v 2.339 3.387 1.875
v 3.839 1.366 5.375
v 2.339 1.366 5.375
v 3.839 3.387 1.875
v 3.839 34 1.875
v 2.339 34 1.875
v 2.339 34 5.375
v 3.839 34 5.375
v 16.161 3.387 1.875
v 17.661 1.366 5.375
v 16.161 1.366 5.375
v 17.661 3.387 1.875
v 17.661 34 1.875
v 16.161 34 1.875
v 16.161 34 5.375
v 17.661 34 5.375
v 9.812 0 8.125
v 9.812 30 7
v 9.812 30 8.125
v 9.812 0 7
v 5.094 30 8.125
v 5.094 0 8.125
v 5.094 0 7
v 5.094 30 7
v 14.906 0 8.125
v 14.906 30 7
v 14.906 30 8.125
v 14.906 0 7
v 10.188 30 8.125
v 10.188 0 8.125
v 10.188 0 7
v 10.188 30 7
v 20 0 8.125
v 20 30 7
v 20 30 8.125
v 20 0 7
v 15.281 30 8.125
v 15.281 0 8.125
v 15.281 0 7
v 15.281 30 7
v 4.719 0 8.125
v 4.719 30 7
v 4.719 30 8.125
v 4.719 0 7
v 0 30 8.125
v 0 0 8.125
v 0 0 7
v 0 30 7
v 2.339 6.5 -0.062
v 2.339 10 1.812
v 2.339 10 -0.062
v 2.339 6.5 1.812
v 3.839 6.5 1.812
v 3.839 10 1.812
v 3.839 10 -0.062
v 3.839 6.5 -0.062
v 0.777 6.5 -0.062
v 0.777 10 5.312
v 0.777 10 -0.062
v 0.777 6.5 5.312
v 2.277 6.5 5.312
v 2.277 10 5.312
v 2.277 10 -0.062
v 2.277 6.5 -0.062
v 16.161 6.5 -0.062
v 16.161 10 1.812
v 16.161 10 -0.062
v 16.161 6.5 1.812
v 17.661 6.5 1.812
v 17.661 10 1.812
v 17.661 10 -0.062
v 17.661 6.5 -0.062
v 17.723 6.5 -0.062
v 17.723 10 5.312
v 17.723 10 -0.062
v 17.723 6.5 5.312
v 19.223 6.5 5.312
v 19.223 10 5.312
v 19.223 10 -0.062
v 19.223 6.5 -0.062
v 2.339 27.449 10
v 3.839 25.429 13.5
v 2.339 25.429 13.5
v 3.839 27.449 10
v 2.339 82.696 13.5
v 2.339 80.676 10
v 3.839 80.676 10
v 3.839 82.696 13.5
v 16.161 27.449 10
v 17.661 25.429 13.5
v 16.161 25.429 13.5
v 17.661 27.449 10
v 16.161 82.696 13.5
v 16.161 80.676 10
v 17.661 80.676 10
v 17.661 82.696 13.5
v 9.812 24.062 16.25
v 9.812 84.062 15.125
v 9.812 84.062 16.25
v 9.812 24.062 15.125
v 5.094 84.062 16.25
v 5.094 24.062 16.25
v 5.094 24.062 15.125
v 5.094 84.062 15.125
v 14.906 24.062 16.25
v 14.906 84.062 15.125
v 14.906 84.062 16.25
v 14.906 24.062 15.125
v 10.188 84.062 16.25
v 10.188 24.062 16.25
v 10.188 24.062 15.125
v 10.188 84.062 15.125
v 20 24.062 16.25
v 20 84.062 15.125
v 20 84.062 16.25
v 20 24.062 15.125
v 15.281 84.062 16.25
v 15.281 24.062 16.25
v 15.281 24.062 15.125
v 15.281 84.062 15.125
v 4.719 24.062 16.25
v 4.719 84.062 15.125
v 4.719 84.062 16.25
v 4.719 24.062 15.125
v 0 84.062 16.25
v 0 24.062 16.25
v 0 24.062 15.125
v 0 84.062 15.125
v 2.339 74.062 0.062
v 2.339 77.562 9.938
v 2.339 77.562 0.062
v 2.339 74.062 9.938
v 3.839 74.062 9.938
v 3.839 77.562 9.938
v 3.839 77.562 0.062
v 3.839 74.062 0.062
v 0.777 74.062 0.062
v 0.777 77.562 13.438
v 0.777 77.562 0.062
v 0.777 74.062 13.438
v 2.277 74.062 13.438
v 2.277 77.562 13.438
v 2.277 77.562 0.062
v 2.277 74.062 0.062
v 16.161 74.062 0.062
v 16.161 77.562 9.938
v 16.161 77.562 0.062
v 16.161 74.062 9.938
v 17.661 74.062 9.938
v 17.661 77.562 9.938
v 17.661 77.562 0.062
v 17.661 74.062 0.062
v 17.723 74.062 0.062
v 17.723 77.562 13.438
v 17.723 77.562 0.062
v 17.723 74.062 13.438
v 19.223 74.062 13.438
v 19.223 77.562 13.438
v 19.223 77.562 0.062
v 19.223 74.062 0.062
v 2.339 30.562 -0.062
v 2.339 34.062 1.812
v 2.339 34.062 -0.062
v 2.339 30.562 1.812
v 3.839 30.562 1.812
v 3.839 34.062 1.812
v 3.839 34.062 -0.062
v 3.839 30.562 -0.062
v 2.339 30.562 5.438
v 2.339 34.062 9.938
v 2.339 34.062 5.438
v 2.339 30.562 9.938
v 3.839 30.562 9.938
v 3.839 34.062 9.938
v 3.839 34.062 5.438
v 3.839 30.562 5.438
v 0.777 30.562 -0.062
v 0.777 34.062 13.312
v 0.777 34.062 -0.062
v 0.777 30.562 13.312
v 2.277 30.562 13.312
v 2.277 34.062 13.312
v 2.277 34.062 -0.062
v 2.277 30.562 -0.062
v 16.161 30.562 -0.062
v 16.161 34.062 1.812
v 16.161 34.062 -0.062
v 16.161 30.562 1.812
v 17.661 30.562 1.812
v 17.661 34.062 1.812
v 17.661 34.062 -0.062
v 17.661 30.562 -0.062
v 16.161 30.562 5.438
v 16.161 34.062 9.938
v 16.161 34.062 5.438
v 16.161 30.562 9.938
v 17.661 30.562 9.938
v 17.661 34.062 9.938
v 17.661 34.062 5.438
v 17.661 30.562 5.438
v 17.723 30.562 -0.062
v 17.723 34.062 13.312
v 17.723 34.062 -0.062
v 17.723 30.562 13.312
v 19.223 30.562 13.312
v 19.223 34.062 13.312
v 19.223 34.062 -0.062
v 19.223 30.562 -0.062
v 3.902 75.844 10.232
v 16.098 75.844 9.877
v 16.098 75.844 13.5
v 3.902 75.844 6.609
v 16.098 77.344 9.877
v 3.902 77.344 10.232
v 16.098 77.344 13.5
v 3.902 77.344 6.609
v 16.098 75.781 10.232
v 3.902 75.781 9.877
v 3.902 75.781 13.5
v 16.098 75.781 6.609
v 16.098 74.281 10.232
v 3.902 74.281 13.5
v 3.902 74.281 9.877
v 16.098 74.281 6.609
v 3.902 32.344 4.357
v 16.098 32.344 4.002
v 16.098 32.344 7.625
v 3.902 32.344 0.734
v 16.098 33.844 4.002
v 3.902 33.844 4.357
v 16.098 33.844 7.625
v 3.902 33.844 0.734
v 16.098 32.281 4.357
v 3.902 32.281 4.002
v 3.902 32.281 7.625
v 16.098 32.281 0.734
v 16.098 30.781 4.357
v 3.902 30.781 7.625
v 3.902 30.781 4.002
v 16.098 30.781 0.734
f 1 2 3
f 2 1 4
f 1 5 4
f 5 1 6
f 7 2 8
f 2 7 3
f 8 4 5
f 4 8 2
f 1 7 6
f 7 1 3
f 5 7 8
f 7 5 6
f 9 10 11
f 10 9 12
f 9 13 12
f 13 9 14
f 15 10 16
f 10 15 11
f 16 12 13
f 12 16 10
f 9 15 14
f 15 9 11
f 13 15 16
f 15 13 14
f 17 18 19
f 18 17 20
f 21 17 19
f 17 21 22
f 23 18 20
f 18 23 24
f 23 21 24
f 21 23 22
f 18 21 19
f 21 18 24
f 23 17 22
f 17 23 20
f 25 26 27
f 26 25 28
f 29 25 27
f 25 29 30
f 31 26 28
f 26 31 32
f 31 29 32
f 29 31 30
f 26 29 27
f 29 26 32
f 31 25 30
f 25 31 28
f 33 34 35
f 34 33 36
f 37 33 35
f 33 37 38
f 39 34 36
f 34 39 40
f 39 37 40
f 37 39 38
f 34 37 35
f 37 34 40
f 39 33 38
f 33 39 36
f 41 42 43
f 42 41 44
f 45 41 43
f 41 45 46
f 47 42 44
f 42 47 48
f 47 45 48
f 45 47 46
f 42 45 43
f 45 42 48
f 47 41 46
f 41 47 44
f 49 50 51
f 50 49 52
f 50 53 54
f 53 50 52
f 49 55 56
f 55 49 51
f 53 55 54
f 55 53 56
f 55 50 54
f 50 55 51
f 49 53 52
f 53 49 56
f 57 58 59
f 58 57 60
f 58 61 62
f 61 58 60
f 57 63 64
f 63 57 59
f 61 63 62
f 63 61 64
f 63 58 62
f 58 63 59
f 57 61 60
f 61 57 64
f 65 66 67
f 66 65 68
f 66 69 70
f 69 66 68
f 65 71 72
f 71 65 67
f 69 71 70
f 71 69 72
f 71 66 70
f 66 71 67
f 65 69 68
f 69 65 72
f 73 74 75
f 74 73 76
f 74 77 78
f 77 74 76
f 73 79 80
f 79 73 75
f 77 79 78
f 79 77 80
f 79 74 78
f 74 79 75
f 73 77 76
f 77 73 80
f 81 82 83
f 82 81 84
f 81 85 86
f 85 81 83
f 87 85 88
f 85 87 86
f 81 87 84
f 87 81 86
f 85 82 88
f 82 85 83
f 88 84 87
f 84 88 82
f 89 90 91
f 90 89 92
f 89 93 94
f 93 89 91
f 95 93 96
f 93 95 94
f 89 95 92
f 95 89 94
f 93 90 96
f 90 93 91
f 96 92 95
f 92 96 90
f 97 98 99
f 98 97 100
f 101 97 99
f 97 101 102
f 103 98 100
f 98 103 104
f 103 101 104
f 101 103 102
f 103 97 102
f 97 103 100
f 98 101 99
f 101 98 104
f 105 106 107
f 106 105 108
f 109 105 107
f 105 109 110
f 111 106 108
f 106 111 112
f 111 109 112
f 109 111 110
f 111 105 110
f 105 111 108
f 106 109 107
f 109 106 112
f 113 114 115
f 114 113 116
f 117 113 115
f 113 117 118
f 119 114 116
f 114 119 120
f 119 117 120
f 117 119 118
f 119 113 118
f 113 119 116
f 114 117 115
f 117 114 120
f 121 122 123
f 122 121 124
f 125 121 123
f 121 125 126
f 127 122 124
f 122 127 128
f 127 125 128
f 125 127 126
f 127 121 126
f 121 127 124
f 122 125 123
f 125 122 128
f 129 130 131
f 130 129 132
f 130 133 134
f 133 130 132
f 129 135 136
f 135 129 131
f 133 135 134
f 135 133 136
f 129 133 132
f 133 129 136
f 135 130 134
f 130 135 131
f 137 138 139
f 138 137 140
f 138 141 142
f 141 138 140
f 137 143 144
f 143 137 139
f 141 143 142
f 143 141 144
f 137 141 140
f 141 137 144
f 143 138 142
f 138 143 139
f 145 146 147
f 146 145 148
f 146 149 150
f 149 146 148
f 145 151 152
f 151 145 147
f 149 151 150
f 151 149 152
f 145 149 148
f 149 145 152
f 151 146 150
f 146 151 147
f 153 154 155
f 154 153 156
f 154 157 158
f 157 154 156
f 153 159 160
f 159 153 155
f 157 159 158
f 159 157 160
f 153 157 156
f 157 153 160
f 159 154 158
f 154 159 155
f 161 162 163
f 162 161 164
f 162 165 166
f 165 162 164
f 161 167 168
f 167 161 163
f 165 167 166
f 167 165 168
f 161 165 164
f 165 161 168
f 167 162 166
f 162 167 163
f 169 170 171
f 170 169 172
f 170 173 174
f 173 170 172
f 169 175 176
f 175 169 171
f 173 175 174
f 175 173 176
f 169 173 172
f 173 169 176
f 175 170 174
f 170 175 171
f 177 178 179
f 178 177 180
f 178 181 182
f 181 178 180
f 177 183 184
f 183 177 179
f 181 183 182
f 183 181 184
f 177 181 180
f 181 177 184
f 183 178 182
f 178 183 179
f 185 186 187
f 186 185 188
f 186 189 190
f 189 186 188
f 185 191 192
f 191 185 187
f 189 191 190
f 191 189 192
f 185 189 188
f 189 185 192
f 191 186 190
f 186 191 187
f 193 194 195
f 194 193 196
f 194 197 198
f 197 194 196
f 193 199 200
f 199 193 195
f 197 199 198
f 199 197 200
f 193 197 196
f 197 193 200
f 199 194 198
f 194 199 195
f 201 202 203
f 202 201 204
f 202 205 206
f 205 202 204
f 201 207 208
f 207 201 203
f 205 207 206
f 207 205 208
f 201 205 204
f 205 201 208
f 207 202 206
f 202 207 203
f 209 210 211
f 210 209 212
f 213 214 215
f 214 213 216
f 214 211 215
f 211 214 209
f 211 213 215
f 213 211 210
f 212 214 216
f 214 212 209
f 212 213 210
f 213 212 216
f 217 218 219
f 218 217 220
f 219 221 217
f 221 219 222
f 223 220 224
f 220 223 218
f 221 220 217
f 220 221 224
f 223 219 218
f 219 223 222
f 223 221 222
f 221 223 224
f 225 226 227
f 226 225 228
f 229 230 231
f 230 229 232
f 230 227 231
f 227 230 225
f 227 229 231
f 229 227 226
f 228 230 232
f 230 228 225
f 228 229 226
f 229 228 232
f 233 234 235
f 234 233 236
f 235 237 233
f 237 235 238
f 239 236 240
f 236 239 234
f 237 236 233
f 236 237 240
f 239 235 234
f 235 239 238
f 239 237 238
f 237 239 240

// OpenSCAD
// brace_angle = 15
// brace_length = 12.6264 [12 5/8] (4)
//
// For 16" bench:
// leg_height = 13.375 [13 3/8] (4)
// leg_height = 9.875 [9 7/8] (2)
// leg_height = 5.375 [5 3/8] (2)
// leg_height = 4.5 [4 1/2] (2)
// leg_height = 1.875 [1 7/8] (4)
//
// For 15" bench:
// leg_height = 12.375 [12 3/8] (4)
// leg_height = 8.875 [8 7/8] (2)
// leg_height = 4.875 [4 7/8] (2)
// leg_height = 4 [4] (2)
// leg_height = 1.375 [1 3/8] (4)
//
// For 14" bench:
// leg_height = 11.375 [11 3/8] (4)
// leg_height = 7.875 [7 7/8] (2)
// leg_height = 4.375 [4 3/8] (2)
// leg_height = 3.5 [3 1/2] (2)
// leg_height = 0.875 [0 7/8] (4)
//
// plank_length = 30, width = 4.125 [4 1/8] (2)
// plank_length = 60, width = 4.125 [4 1/8] (2)
// plank_length = 30, width = 5.3125 [5 5/16] (2)
// plank_length = 60, width = 5.3125 [5 5/16] (2)
//
// support_end_bevel_angle = 30
// support_length = 57.2679 [57 1/4], bevel_both_ends = true (2)
// support_length = 32.634 [32 5/8], bevel_both_ends = false (2)
//
// top_joist_end_bevel_angle = 15
// top_joist_length_bevel_angle = 30
// top_joist_length = 19, bevel_length = true (3)
// top_joist_length = 19 (6)

function mm(x) = cm(x)/10;
function cm(x) = in(x)/2.54;
function in(x) = x;
function ft(x,i=0) = in(x*12+i);

epsilon = mm(1);
explode_gap = in(1/16);

lumber_thickness = in(1.5);
lumber_width = in(3.5);
bench_depth = in(20);
bench_length = in(60);
step_depth = bench_depth;
step_length = in(30);
step_height = in(8);
step_overlap = bench_length + step_length - ft(7);
echo(step_overlap=step_overlap);
bench_height = 2*step_height;
decking_overhang = in(1/2);
top_joist_length = bench_depth - 2*decking_overhang;

decking_natural_width = in(5+5/16);
decking_gap = in(3/8);
decking_planks = ceil((bench_depth + decking_gap) / (decking_natural_width + decking_gap));
decking_width = (bench_depth + decking_gap) / decking_planks - decking_gap;
decking_spacing = decking_width + decking_gap;
decking_thickness = in(1+1/8);

lightwalnut = [0.397, 0.315, 0.228];

side_bevel_angle = 15;
end_bevel_angle = 30;
brace_angle=side_bevel_angle;

echo(side_bevel_angle=side_bevel_angle);
echo(end_bevel_angle=end_bevel_angle);
echo(brace_angle=brace_angle);

echo(leg_setback=step_overlap-tan(end_bevel_angle)*(lumber_width+lumber_thickness));


supports_outside = false;

module top_joist(near_bottom_offset = 0, far_bottom_offset = 0) {
    if (near_bottom_offset!=0||far_bottom_offset!=0) {
        echo(top_joist_length=top_joist_length,bevel_length=true);
    } else {
        echo(top_joist_length=top_joist_length);
    }
    polyhedron(
            points=[[0, 0, lumber_thickness],
                    [top_joist_length, 0, lumber_thickness],
                    [top_joist_length - tan(side_bevel_angle)*lumber_thickness, near_bottom_offset, 0],
                    [tan(side_bevel_angle)*lumber_thickness, near_bottom_offset, 0],
                    [0, lumber_width, lumber_thickness],
                    [top_joist_length, lumber_width, lumber_thickness],
                    [top_joist_length - tan(side_bevel_angle)*lumber_thickness, lumber_width - far_bottom_offset, 0],
                    [tan(side_bevel_angle)*lumber_thickness, lumber_width - far_bottom_offset, 0]],
            faces=[[0, 1, 2, 3],
                   [4, 5, 6, 7],
                   [4, 5, 1, 0],
                   [2, 3, 7, 6],
                   [4, 0, 3, 7],
                   [1, 5, 6, 2]]);
}

module top_joists(length, bevel_far_end = true) {
    translate([decking_overhang, 0, 0]) {
        spans = floor(length / in(12));
        for (i = [0:spans]) {
            spacing = (length - lumber_width - 2*decking_overhang) / spans;
            echo(spacing=spacing);
            translate([0, decking_overhang + i * spacing, 0]) {
                if (i == 0) {
                    top_joist(near_bottom_offset = tan(end_bevel_angle)*lumber_thickness);
                } else if (i == spans && bevel_far_end) {
                    top_joist(far_bottom_offset = tan(end_bevel_angle)*lumber_thickness);
                } else {
                    top_joist();
                }
            }
        }
    }
}
module bench_top_joists() {
    top_joists(bench_length);
}

module step_top_joists() {
    top_joists(step_length, bevel_far_end = false);
}

module planks(length) {
    edge_decking_width = (bench_depth - (decking_spacing - decking_width) - (decking_planks-2) * decking_spacing) / 2;
    translate([-max(0, explode_gap-(decking_spacing - decking_width))*(decking_planks-1)/2, 0, 0]) {
        echo(plank_length=length,width=edge_decking_width);
        cube([edge_decking_width, length, decking_thickness]);
        translate([edge_decking_width + max(decking_spacing - decking_width, explode_gap), 0, 0]) {
            for (i = [0:decking_planks-3]) {
                translate([i * max(decking_spacing, decking_width+explode_gap), 0, 0]) {
                    echo(plank_length=length,width=decking_width);
                    cube([decking_width, length, decking_thickness]);
                }
            }
            translate([(decking_planks - 2) * max(decking_spacing, decking_width + explode_gap), 0, 0]) {
                echo(plank_length=length,width=edge_decking_width);
                cube([edge_decking_width, length, decking_thickness]);
            }
        }
    }
}

module support(length, bevel_far_end = true) {
    translate([0, tan(end_bevel_angle)*lumber_thickness + decking_overhang, 0]) {
        rotate([90, 0, 90]) {
            top_length = length - decking_overhang - tan(end_bevel_angle)*lumber_thickness - (bevel_far_end ? decking_overhang + tan(end_bevel_angle)*lumber_thickness : 0);
            bottom_length = length - decking_overhang - tan(end_bevel_angle)*(lumber_thickness + lumber_width) - (bevel_far_end ? decking_overhang + tan(end_bevel_angle)*(lumber_thickness + lumber_width): 0);
            echo(support_length=top_length,bevel_both_ends=bevel_far_end);
            linear_extrude(height = lumber_thickness) {
                polygon([[0, lumber_width],
                         [top_length, lumber_width],
                         [tan(end_bevel_angle)*lumber_width + bottom_length, 0],
                         [tan(end_bevel_angle)*lumber_width, 0]]);
            }
        }
    }
}

module supports(length, bevel_far_end = true) {
    inset = decking_overhang + tan(side_bevel_angle)*lumber_thickness + (supports_outside?0:lumber_thickness-explode_gap);
    translate([inset, 0, 0]) {
        support(length, bevel_far_end=bevel_far_end);
    }
    translate([bench_depth - inset - lumber_thickness, 0, 0]) {
        support(length, bevel_far_end=bevel_far_end);
    }
}

module leg(height) {
    echo(leg_height=height);
    cube([lumber_thickness, lumber_width, height]);
}

module legs(height, length, include_far_legs = true) {
    inset = decking_overhang + tan(side_bevel_angle)*lumber_thickness + (supports_outside?0:-explode_gap);
    translate([inset, step_overlap + decking_overhang, 0]) {
        translate([supports_outside?0:2*lumber_thickness-explode_gap,0,0]) mirror([supports_outside?0:1,0,0]) {
            translate([-explode_gap, 0, -explode_gap]) {
                leg(height-lumber_thickness-lumber_width);
            }
            translate([lumber_thickness, 0, -explode_gap]) {
                leg(height-lumber_thickness);
            }
        }
        translate([bench_depth-2*inset-lumber_thickness, 0, 0]) {
            translate([explode_gap,0,0]) mirror([supports_outside?0:1,0,0]) {
                translate([explode_gap, 0, -explode_gap]) {
                    leg(height-lumber_thickness-lumber_width);
                }
                translate([-lumber_thickness, 0, -explode_gap]) {
                    leg(height-lumber_thickness);
                }
            }
        }
    }
    if (include_far_legs) {
        translate([inset, length - step_overlap - lumber_width - decking_overhang, 0]) {
            translate([supports_outside?0:2*lumber_thickness-explode_gap,0,0]) mirror([supports_outside?0:1,0,0]) {
                translate([-explode_gap, 0, -3*explode_gap]) {
                    leg(step_height-decking_thickness-lumber_thickness-lumber_width);
                }
                translate([-explode_gap, 0, step_height-decking_thickness-lumber_thickness - explode_gap]) {
                    leg(height-(step_height-decking_thickness)-lumber_width);
                }
                translate([lumber_thickness, 0, -3*explode_gap]) {
                    leg(height-lumber_thickness);
                }
            }
            translate([bench_depth-2*inset-lumber_thickness, 0, 0]) {
                translate([explode_gap,0,0]) mirror([supports_outside?0:1,0,0]) {
                    translate([explode_gap, 0, -3*explode_gap]) {
                        leg(step_height-decking_thickness-lumber_thickness-lumber_width);
                    }
                    translate([explode_gap, 0, step_height-decking_thickness-lumber_thickness - explode_gap]) {
                        leg(height-(step_height-decking_thickness)-lumber_width);
                    }
                    translate([-lumber_thickness, 0, -3*explode_gap]) {
                        leg(height-lumber_thickness);
                    }
                }
            }
        }
    }
}

module brace_segment(span) {
    rotate([90, 0, 0]) {
        linear_extrude(height = lumber_thickness) {
            cut_length=lumber_width/cos(brace_angle);
            rise=tan(brace_angle)*span;
            echo(brace_length=span/cos(brace_angle));
            polygon([[0, 0],
                     [0, cut_length],
                     [span, rise + cut_length],
                     [span, rise]]);
        }
    }
}

module brace(span) {
    translate([0,0,0]) {
        brace_segment(span);
    }
    translate([span,lumber_thickness+explode_gap,0]) {
        mirror([1,0,0]) brace_segment(span);
    }
}

module bracing() {
    brace_offset=decking_overhang+tan(side_bevel_angle)*lumber_thickness+2*lumber_thickness;
    brace_span=bench_depth-2*brace_offset;
    brace_height=brace_span*tan(brace_angle)+lumber_width/cos(brace_angle);
    translate([0, -explode_gap/2, bench_height - decking_thickness - lumber_thickness - brace_height]) {
        translate([brace_offset, step_overlap + decking_overhang + lumber_thickness + (lumber_width - 2*lumber_thickness)/2, 0]) {
            brace(brace_span);
        }
    }
    translate([0, -explode_gap/2, step_height - in(1/2) - brace_height]) {
        translate([brace_offset,bench_length - (step_overlap + decking_overhang + lumber_thickness) - (lumber_width - 2*lumber_thickness)/2,0]) {
            brace(brace_span);
        }
    }
}

module bench() {
    translate([0, 0, bench_height - decking_thickness - lumber_thickness - lumber_width]) {
        supports(bench_length);
    }
    translate([0, 0, bench_height - decking_thickness - lumber_thickness + explode_gap]) {
        bench_top_joists();
    }
    translate([0, 0, bench_height - decking_thickness + 2 * explode_gap]) {
        planks(bench_length);
    }
    legs(bench_height - decking_thickness, bench_length);
    bracing();
}

module step() {
    translate([0, 0, step_height - decking_thickness - lumber_thickness - lumber_width]) {
        supports(step_length + decking_overhang + lumber_width, bevel_far_end = false);
    }
    translate([0, 0, step_height - decking_thickness - lumber_thickness + explode_gap]) {
        step_top_joists();
    }
    translate([0, 0, step_height - decking_thickness + 2 * explode_gap]) {
        planks(step_length);
    }
    legs(step_height - decking_thickness, step_length, include_far_legs = false);
}

module bench_and_step() {
    step();
    translate([0, bench_length + step_length - step_overlap + explode_gap, 2*explode_gap]) {
        mirror([0, 1, 0]) bench();
    }
}

color(lightwalnut) bench_and_step();
